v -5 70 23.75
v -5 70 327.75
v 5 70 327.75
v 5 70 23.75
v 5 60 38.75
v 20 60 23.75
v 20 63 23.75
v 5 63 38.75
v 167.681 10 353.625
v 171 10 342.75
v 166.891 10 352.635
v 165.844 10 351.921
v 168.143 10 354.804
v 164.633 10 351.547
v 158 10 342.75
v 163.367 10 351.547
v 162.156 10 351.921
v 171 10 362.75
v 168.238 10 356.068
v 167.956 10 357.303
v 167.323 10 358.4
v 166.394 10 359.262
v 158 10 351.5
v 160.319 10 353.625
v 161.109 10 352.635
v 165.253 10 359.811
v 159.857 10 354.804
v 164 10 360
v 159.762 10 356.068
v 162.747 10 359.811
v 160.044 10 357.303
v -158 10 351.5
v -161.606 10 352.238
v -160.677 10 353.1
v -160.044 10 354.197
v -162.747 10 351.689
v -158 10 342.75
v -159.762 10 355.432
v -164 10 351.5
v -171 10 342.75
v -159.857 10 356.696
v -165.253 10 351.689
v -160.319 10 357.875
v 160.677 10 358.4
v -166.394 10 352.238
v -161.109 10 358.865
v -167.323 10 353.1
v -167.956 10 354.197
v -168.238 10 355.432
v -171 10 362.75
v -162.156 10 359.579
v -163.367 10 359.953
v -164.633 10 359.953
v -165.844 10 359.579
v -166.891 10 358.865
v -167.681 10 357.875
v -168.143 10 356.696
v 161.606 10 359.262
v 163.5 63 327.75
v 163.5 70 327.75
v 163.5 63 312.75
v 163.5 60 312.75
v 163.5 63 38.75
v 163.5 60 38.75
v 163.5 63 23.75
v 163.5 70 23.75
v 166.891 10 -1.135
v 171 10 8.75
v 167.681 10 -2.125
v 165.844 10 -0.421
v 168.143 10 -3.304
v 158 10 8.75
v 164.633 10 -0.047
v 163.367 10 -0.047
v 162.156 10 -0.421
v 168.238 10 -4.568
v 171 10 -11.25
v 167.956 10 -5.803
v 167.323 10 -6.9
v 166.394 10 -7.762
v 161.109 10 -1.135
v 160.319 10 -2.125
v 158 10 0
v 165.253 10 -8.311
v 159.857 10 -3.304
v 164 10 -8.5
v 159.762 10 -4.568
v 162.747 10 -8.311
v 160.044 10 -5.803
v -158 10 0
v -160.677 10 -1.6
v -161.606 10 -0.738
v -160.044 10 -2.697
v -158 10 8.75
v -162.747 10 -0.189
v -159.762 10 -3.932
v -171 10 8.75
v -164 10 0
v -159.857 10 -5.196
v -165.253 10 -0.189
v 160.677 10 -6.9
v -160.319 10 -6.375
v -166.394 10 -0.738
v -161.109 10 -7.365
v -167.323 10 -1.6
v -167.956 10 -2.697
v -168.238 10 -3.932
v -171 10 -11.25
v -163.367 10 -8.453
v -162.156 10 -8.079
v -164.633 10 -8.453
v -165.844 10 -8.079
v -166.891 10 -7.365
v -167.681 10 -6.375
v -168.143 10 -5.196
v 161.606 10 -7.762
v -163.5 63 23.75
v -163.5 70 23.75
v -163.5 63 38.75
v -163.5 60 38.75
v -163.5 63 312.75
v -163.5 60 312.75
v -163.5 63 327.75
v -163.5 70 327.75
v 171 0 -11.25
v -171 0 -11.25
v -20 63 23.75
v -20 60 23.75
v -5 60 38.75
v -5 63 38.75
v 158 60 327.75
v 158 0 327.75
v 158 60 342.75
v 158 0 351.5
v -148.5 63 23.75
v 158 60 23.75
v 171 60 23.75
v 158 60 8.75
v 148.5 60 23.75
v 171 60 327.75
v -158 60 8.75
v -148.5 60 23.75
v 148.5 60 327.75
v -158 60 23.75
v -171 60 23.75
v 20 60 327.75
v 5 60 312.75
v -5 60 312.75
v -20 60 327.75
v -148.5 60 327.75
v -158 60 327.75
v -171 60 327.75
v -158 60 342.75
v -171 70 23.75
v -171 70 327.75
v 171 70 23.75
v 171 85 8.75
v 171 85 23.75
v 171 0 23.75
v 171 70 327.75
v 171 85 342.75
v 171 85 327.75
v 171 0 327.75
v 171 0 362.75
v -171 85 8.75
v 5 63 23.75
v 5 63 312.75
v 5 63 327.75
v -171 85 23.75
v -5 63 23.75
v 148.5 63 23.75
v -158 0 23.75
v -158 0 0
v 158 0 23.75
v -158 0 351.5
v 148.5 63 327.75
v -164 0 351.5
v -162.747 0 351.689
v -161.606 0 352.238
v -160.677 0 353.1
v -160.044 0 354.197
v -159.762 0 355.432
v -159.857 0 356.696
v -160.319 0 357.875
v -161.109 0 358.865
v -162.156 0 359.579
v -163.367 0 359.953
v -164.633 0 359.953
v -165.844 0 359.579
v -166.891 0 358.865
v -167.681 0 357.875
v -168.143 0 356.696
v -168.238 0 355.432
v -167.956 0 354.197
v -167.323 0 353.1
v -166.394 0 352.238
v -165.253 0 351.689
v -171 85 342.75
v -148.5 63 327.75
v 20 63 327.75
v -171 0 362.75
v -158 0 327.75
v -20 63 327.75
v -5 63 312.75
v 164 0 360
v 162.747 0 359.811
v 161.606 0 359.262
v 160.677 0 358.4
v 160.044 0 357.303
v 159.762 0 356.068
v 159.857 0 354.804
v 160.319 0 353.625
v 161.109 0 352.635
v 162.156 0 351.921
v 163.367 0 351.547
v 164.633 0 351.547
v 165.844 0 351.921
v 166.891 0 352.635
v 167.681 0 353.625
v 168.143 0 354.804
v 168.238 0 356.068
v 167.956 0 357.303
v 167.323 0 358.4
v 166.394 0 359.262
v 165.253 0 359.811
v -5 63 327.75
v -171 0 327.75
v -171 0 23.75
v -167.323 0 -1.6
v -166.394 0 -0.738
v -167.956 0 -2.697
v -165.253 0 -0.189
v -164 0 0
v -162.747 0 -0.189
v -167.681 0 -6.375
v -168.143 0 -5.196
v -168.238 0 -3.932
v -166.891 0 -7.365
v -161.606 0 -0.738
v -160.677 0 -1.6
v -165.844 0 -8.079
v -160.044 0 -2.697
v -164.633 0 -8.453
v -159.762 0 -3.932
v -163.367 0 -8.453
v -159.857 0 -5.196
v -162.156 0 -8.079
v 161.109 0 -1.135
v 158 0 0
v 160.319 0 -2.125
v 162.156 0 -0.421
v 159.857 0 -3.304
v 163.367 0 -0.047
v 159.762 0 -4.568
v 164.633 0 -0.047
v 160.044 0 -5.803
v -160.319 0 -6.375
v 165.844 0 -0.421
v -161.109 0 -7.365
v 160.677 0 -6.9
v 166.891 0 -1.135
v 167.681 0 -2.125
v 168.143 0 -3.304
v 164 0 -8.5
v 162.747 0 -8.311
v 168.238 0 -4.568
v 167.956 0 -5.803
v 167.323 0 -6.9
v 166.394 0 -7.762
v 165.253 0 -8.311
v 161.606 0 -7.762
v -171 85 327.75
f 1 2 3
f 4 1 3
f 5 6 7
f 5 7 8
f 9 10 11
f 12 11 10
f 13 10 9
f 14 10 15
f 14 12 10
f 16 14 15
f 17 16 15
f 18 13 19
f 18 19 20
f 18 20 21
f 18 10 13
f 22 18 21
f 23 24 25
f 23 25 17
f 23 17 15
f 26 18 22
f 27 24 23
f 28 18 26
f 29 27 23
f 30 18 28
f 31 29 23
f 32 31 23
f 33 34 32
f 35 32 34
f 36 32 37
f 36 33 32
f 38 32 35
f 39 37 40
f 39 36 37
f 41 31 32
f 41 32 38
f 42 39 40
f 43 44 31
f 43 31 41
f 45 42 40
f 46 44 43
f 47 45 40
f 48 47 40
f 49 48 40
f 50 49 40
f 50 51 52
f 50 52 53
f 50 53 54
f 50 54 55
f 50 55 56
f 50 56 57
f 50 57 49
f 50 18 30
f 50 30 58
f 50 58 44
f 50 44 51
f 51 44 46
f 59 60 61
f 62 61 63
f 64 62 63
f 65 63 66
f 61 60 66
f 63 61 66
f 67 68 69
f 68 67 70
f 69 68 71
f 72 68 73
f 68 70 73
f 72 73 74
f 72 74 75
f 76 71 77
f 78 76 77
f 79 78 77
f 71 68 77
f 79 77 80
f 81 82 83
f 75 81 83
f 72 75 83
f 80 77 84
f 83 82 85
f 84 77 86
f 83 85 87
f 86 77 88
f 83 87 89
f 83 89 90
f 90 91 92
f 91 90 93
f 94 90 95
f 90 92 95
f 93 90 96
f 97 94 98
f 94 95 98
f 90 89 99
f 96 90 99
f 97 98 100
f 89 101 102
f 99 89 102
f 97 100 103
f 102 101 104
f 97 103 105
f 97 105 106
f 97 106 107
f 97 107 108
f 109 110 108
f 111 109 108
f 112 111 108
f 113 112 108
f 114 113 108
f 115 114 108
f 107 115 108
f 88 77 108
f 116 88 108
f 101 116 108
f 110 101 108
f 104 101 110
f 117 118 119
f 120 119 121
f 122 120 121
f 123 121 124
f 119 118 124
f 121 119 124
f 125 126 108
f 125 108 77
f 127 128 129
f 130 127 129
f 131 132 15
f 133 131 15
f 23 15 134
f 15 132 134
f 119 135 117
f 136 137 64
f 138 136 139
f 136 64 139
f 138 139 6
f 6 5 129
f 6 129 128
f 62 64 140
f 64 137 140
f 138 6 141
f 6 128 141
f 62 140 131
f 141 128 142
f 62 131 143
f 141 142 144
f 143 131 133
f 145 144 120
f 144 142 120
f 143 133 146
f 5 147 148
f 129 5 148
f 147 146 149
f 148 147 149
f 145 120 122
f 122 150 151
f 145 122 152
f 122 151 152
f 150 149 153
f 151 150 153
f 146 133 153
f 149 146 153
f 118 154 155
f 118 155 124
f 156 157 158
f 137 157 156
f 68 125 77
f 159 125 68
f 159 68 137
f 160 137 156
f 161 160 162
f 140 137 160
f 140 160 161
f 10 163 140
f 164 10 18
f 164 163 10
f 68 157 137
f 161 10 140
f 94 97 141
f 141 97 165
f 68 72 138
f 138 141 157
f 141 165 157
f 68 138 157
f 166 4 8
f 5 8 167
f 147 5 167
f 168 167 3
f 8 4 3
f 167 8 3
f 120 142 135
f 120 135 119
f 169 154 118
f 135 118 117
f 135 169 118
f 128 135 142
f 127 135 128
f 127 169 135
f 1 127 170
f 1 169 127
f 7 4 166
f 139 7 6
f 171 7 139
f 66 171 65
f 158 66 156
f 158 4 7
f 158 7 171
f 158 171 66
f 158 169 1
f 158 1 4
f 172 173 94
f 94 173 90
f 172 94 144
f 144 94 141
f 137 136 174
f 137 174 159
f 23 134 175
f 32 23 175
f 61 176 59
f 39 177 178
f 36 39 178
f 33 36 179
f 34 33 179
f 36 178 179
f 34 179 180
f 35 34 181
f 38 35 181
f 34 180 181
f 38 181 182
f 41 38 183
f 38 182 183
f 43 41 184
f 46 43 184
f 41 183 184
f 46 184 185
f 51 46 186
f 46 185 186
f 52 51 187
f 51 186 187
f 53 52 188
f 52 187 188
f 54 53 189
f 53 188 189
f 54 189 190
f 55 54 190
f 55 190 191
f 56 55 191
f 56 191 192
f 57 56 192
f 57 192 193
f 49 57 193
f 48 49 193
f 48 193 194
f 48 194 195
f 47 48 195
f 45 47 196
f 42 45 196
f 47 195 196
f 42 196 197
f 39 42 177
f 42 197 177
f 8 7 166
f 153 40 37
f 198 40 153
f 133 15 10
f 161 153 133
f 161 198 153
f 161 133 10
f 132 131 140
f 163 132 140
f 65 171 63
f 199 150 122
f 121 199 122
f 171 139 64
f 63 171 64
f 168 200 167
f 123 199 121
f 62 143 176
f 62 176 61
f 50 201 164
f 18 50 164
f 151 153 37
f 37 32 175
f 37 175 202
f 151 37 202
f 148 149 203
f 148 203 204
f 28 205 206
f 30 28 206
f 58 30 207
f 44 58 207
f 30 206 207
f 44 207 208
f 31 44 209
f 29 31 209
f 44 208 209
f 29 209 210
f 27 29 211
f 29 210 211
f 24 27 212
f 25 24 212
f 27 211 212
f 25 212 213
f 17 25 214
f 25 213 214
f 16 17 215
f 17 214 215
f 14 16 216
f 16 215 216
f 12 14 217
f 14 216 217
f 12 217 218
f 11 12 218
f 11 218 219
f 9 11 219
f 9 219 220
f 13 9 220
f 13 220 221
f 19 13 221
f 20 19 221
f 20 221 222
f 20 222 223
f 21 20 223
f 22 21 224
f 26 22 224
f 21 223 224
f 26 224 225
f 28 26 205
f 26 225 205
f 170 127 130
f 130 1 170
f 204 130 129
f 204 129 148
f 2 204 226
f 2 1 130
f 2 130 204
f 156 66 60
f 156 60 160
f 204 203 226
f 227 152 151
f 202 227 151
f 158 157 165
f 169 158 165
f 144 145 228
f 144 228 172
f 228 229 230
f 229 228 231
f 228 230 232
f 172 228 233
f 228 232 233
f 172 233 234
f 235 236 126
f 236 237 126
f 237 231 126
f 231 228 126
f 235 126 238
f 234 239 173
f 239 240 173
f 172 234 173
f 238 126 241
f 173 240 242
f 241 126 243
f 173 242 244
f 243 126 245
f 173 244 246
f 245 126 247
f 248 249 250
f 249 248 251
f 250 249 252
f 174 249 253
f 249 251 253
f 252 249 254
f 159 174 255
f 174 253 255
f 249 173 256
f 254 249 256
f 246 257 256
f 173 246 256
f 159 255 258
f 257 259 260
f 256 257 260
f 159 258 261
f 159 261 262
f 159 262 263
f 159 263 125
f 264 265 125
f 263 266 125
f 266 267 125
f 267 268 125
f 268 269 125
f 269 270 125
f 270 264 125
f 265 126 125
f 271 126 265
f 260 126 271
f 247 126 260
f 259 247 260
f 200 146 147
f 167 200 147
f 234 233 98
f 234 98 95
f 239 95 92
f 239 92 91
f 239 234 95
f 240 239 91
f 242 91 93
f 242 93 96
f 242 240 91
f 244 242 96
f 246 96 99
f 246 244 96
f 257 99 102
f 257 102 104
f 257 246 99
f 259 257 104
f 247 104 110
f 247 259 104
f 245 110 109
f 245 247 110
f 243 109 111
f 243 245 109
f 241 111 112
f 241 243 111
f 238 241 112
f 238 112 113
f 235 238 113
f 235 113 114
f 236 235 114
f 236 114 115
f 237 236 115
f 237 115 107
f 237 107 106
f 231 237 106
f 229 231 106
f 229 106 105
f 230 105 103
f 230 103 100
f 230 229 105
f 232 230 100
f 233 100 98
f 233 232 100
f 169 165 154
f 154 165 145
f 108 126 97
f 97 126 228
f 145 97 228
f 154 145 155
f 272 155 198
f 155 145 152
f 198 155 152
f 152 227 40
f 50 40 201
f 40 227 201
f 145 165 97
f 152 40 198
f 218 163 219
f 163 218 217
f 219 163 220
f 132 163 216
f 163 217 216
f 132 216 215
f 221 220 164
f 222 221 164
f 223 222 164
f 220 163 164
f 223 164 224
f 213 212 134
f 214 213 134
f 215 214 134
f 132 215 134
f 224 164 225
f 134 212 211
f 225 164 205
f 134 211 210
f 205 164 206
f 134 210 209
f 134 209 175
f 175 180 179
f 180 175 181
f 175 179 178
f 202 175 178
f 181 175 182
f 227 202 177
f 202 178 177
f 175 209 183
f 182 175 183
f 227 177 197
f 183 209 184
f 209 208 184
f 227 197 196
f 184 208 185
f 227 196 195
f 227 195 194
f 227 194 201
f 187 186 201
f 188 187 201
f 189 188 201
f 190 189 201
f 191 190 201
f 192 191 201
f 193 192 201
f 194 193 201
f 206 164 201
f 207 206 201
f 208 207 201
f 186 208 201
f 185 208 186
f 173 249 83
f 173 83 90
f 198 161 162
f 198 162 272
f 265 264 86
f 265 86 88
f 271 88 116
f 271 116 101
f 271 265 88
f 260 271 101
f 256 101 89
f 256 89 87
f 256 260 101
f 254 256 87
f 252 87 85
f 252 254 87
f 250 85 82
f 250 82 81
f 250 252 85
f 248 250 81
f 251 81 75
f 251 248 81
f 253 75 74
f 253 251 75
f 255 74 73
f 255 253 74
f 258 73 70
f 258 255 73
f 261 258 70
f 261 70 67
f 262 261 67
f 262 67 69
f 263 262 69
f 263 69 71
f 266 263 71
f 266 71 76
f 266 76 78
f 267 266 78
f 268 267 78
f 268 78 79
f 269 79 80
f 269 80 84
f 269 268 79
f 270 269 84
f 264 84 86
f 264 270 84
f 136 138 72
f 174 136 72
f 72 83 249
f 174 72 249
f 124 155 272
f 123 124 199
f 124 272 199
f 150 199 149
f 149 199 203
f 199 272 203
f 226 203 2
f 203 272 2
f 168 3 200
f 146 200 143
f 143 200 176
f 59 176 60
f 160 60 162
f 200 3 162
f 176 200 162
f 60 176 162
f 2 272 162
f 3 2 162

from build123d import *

# Parameters (mm, degrees)
SKETCH1_R                                = 4.25
BOSS_EXTRUDE1_DEPTH                      = 10
BOSS_EXTRUDE2_START                      = -5
BOSS_EXTRUDE2_DEPTH                      = 15
SKETCH3_W                                = 342
SKETCH3_H                                = 10
BOSS_EXTRUDE3_DEPTH                      = 304
CUT_EXTRUDE1_REACH                       = 381.323
BOSS_EXTRUDE4_DEPTH                      = 3
MIRROR5_AT_THE_SECOND_PLANE_COPY_1_DEPTH = 3


with BuildPart() as part:
    # Sketch1 → Boss-Extrude1 (new body)
    with BuildSketch(Plane(origin=(0, 0, 0), x_dir=(1, 0, 0), z_dir=(0, 1, 0))):
        Polygon((-171, 11.25), (171, 11.25), (171, 0), (171, -13.75), (158, -13.75), (158, 0), (-158, 0), (-158, -13.75), (-171, -13.75), align=None)
        with Locations(Location((-164, 4.25, 0), (0, 0, 270))):
            Circle(SKETCH1_R, mode=Mode.SUBTRACT)
        with Locations(Location((164, 4.25, 0), (0, 0, 90))):
            Circle(SKETCH1_R, mode=Mode.SUBTRACT)
    boss_extrude1 = extrude(amount=BOSS_EXTRUDE1_DEPTH)

    # Sketch2 → Boss-Extrude2 (add)
    with BuildSketch(Plane.XY.offset(13.75).offset(BOSS_EXTRUDE2_START)):
        Polygon((-171, 85), (-171, 0), (-158, 0), (-158, 60), (158, 60), (158, 0), (171, 0), (171, 85), align=None)
    boss_extrude2 = extrude(amount=BOSS_EXTRUDE2_DEPTH)

    # Sketch3 → Boss-Extrude3 (add)
    with BuildSketch(Plane.XY.offset(23.75)):
        with Locations((0, 65)):
            Rectangle(SKETCH3_W, SKETCH3_H)
    extrude(amount=BOSS_EXTRUDE3_DEPTH)

    # Sketch4 → Cut-Extrude1 (cut, up to next)
    with BuildSketch(Plane(origin=(0, 85, 0), x_dir=(1, 0, 0), z_dir=(0, 1, 0)), mode=Mode.PRIVATE) as cut_extrude1_sk1:
        Polygon((-163.5, -23.75), (-5, -23.75), (-5, -327.75), (-163.5, -327.75), (-163.5, -39.75), (-163.5, -34.75), align=None)
    cut_extrude1_tool1 = extrude(cut_extrude1_sk1.sketch, amount=-CUT_EXTRUDE1_REACH, mode=Mode.PRIVATE) & part.part
    # Sketch4 → Cut-Extrude1 (cut, up to next)
    with BuildSketch(Plane(origin=(0, 85, 0), x_dir=(1, 0, 0), z_dir=(0, 1, 0)), mode=Mode.PRIVATE) as cut_extrude1_sk2:
        Polygon((163.5, -23.75), (163.5, -51.4723011), (163.5, -327.75), (5, -327.75), (5, -39.75), (5, -23.75), align=None)
    cut_extrude1_tool2 = extrude(cut_extrude1_sk2.sketch, amount=-CUT_EXTRUDE1_REACH, mode=Mode.PRIVATE) & part.part
    add(cut_extrude1_tool1.solids().sort_by_distance((-84.25, 85, 175.75))[0], mode=Mode.SUBTRACT)
    add(cut_extrude1_tool2.solids().sort_by_distance((84.25, 85, 175.75))[0], mode=Mode.SUBTRACT)

    # Mirror3: Boss-Extrude2 across plane
    add(boss_extrude2.mirror(Plane(origin=(0, 0, 175.75), x_dir=(1, 0, 0), z_dir=(0, 0, -1))))

    # Mirror4: Boss-Extrude1 across plane
    add(boss_extrude1.mirror(Plane(origin=(0, 0, 175.75), x_dir=(1, 0, 0), z_dir=(0, 0, -1))))

    # Sketch7 → Boss-Extrude4 (add)
    with BuildSketch(Plane(origin=(0, 60, 0), x_dir=(-1, 0, 0), z_dir=(0, -1, 0))):
        Polygon((-163.5, -23.75), (-148.5, -23.75), (-163.5, -38.75), align=None)
        Polygon((-5, -23.75), (-20, -23.75), (-5, -38.75), align=None)
    boss_extrude4 = extrude(amount=-BOSS_EXTRUDE4_DEPTH)

    # Mirror5: Boss-Extrude4 across plane
    add(boss_extrude4.mirror(Plane(origin=(0, 0, 175.75), x_dir=(1, 0, 0), z_dir=(0, 0, -1))))

    # Mirror5 at the second plane: Boss-Extrude4 across plane
    add(boss_extrude4.mirror(Plane(origin=(0, 0, 0), x_dir=(0, 0, 1), z_dir=(1, 0, 0))))

    # Mirror5 at the second plane copy 1 sketc → Mirror5 at the second plane copy 1 (add)
    with BuildSketch(Plane(origin=(0, 60, 351.5), x_dir=(1, 0, 0), z_dir=(0, -1, 0))):
        Polygon((-163.5, -23.75), (-148.5, -23.75), (-163.5, -38.75), align=None)
        Polygon((-5, -23.75), (-20, -23.75), (-5, -38.75), align=None)
    extrude(amount=-MIRROR5_AT_THE_SECOND_PLANE_COPY_1_DEPTH)


solid = part.part
